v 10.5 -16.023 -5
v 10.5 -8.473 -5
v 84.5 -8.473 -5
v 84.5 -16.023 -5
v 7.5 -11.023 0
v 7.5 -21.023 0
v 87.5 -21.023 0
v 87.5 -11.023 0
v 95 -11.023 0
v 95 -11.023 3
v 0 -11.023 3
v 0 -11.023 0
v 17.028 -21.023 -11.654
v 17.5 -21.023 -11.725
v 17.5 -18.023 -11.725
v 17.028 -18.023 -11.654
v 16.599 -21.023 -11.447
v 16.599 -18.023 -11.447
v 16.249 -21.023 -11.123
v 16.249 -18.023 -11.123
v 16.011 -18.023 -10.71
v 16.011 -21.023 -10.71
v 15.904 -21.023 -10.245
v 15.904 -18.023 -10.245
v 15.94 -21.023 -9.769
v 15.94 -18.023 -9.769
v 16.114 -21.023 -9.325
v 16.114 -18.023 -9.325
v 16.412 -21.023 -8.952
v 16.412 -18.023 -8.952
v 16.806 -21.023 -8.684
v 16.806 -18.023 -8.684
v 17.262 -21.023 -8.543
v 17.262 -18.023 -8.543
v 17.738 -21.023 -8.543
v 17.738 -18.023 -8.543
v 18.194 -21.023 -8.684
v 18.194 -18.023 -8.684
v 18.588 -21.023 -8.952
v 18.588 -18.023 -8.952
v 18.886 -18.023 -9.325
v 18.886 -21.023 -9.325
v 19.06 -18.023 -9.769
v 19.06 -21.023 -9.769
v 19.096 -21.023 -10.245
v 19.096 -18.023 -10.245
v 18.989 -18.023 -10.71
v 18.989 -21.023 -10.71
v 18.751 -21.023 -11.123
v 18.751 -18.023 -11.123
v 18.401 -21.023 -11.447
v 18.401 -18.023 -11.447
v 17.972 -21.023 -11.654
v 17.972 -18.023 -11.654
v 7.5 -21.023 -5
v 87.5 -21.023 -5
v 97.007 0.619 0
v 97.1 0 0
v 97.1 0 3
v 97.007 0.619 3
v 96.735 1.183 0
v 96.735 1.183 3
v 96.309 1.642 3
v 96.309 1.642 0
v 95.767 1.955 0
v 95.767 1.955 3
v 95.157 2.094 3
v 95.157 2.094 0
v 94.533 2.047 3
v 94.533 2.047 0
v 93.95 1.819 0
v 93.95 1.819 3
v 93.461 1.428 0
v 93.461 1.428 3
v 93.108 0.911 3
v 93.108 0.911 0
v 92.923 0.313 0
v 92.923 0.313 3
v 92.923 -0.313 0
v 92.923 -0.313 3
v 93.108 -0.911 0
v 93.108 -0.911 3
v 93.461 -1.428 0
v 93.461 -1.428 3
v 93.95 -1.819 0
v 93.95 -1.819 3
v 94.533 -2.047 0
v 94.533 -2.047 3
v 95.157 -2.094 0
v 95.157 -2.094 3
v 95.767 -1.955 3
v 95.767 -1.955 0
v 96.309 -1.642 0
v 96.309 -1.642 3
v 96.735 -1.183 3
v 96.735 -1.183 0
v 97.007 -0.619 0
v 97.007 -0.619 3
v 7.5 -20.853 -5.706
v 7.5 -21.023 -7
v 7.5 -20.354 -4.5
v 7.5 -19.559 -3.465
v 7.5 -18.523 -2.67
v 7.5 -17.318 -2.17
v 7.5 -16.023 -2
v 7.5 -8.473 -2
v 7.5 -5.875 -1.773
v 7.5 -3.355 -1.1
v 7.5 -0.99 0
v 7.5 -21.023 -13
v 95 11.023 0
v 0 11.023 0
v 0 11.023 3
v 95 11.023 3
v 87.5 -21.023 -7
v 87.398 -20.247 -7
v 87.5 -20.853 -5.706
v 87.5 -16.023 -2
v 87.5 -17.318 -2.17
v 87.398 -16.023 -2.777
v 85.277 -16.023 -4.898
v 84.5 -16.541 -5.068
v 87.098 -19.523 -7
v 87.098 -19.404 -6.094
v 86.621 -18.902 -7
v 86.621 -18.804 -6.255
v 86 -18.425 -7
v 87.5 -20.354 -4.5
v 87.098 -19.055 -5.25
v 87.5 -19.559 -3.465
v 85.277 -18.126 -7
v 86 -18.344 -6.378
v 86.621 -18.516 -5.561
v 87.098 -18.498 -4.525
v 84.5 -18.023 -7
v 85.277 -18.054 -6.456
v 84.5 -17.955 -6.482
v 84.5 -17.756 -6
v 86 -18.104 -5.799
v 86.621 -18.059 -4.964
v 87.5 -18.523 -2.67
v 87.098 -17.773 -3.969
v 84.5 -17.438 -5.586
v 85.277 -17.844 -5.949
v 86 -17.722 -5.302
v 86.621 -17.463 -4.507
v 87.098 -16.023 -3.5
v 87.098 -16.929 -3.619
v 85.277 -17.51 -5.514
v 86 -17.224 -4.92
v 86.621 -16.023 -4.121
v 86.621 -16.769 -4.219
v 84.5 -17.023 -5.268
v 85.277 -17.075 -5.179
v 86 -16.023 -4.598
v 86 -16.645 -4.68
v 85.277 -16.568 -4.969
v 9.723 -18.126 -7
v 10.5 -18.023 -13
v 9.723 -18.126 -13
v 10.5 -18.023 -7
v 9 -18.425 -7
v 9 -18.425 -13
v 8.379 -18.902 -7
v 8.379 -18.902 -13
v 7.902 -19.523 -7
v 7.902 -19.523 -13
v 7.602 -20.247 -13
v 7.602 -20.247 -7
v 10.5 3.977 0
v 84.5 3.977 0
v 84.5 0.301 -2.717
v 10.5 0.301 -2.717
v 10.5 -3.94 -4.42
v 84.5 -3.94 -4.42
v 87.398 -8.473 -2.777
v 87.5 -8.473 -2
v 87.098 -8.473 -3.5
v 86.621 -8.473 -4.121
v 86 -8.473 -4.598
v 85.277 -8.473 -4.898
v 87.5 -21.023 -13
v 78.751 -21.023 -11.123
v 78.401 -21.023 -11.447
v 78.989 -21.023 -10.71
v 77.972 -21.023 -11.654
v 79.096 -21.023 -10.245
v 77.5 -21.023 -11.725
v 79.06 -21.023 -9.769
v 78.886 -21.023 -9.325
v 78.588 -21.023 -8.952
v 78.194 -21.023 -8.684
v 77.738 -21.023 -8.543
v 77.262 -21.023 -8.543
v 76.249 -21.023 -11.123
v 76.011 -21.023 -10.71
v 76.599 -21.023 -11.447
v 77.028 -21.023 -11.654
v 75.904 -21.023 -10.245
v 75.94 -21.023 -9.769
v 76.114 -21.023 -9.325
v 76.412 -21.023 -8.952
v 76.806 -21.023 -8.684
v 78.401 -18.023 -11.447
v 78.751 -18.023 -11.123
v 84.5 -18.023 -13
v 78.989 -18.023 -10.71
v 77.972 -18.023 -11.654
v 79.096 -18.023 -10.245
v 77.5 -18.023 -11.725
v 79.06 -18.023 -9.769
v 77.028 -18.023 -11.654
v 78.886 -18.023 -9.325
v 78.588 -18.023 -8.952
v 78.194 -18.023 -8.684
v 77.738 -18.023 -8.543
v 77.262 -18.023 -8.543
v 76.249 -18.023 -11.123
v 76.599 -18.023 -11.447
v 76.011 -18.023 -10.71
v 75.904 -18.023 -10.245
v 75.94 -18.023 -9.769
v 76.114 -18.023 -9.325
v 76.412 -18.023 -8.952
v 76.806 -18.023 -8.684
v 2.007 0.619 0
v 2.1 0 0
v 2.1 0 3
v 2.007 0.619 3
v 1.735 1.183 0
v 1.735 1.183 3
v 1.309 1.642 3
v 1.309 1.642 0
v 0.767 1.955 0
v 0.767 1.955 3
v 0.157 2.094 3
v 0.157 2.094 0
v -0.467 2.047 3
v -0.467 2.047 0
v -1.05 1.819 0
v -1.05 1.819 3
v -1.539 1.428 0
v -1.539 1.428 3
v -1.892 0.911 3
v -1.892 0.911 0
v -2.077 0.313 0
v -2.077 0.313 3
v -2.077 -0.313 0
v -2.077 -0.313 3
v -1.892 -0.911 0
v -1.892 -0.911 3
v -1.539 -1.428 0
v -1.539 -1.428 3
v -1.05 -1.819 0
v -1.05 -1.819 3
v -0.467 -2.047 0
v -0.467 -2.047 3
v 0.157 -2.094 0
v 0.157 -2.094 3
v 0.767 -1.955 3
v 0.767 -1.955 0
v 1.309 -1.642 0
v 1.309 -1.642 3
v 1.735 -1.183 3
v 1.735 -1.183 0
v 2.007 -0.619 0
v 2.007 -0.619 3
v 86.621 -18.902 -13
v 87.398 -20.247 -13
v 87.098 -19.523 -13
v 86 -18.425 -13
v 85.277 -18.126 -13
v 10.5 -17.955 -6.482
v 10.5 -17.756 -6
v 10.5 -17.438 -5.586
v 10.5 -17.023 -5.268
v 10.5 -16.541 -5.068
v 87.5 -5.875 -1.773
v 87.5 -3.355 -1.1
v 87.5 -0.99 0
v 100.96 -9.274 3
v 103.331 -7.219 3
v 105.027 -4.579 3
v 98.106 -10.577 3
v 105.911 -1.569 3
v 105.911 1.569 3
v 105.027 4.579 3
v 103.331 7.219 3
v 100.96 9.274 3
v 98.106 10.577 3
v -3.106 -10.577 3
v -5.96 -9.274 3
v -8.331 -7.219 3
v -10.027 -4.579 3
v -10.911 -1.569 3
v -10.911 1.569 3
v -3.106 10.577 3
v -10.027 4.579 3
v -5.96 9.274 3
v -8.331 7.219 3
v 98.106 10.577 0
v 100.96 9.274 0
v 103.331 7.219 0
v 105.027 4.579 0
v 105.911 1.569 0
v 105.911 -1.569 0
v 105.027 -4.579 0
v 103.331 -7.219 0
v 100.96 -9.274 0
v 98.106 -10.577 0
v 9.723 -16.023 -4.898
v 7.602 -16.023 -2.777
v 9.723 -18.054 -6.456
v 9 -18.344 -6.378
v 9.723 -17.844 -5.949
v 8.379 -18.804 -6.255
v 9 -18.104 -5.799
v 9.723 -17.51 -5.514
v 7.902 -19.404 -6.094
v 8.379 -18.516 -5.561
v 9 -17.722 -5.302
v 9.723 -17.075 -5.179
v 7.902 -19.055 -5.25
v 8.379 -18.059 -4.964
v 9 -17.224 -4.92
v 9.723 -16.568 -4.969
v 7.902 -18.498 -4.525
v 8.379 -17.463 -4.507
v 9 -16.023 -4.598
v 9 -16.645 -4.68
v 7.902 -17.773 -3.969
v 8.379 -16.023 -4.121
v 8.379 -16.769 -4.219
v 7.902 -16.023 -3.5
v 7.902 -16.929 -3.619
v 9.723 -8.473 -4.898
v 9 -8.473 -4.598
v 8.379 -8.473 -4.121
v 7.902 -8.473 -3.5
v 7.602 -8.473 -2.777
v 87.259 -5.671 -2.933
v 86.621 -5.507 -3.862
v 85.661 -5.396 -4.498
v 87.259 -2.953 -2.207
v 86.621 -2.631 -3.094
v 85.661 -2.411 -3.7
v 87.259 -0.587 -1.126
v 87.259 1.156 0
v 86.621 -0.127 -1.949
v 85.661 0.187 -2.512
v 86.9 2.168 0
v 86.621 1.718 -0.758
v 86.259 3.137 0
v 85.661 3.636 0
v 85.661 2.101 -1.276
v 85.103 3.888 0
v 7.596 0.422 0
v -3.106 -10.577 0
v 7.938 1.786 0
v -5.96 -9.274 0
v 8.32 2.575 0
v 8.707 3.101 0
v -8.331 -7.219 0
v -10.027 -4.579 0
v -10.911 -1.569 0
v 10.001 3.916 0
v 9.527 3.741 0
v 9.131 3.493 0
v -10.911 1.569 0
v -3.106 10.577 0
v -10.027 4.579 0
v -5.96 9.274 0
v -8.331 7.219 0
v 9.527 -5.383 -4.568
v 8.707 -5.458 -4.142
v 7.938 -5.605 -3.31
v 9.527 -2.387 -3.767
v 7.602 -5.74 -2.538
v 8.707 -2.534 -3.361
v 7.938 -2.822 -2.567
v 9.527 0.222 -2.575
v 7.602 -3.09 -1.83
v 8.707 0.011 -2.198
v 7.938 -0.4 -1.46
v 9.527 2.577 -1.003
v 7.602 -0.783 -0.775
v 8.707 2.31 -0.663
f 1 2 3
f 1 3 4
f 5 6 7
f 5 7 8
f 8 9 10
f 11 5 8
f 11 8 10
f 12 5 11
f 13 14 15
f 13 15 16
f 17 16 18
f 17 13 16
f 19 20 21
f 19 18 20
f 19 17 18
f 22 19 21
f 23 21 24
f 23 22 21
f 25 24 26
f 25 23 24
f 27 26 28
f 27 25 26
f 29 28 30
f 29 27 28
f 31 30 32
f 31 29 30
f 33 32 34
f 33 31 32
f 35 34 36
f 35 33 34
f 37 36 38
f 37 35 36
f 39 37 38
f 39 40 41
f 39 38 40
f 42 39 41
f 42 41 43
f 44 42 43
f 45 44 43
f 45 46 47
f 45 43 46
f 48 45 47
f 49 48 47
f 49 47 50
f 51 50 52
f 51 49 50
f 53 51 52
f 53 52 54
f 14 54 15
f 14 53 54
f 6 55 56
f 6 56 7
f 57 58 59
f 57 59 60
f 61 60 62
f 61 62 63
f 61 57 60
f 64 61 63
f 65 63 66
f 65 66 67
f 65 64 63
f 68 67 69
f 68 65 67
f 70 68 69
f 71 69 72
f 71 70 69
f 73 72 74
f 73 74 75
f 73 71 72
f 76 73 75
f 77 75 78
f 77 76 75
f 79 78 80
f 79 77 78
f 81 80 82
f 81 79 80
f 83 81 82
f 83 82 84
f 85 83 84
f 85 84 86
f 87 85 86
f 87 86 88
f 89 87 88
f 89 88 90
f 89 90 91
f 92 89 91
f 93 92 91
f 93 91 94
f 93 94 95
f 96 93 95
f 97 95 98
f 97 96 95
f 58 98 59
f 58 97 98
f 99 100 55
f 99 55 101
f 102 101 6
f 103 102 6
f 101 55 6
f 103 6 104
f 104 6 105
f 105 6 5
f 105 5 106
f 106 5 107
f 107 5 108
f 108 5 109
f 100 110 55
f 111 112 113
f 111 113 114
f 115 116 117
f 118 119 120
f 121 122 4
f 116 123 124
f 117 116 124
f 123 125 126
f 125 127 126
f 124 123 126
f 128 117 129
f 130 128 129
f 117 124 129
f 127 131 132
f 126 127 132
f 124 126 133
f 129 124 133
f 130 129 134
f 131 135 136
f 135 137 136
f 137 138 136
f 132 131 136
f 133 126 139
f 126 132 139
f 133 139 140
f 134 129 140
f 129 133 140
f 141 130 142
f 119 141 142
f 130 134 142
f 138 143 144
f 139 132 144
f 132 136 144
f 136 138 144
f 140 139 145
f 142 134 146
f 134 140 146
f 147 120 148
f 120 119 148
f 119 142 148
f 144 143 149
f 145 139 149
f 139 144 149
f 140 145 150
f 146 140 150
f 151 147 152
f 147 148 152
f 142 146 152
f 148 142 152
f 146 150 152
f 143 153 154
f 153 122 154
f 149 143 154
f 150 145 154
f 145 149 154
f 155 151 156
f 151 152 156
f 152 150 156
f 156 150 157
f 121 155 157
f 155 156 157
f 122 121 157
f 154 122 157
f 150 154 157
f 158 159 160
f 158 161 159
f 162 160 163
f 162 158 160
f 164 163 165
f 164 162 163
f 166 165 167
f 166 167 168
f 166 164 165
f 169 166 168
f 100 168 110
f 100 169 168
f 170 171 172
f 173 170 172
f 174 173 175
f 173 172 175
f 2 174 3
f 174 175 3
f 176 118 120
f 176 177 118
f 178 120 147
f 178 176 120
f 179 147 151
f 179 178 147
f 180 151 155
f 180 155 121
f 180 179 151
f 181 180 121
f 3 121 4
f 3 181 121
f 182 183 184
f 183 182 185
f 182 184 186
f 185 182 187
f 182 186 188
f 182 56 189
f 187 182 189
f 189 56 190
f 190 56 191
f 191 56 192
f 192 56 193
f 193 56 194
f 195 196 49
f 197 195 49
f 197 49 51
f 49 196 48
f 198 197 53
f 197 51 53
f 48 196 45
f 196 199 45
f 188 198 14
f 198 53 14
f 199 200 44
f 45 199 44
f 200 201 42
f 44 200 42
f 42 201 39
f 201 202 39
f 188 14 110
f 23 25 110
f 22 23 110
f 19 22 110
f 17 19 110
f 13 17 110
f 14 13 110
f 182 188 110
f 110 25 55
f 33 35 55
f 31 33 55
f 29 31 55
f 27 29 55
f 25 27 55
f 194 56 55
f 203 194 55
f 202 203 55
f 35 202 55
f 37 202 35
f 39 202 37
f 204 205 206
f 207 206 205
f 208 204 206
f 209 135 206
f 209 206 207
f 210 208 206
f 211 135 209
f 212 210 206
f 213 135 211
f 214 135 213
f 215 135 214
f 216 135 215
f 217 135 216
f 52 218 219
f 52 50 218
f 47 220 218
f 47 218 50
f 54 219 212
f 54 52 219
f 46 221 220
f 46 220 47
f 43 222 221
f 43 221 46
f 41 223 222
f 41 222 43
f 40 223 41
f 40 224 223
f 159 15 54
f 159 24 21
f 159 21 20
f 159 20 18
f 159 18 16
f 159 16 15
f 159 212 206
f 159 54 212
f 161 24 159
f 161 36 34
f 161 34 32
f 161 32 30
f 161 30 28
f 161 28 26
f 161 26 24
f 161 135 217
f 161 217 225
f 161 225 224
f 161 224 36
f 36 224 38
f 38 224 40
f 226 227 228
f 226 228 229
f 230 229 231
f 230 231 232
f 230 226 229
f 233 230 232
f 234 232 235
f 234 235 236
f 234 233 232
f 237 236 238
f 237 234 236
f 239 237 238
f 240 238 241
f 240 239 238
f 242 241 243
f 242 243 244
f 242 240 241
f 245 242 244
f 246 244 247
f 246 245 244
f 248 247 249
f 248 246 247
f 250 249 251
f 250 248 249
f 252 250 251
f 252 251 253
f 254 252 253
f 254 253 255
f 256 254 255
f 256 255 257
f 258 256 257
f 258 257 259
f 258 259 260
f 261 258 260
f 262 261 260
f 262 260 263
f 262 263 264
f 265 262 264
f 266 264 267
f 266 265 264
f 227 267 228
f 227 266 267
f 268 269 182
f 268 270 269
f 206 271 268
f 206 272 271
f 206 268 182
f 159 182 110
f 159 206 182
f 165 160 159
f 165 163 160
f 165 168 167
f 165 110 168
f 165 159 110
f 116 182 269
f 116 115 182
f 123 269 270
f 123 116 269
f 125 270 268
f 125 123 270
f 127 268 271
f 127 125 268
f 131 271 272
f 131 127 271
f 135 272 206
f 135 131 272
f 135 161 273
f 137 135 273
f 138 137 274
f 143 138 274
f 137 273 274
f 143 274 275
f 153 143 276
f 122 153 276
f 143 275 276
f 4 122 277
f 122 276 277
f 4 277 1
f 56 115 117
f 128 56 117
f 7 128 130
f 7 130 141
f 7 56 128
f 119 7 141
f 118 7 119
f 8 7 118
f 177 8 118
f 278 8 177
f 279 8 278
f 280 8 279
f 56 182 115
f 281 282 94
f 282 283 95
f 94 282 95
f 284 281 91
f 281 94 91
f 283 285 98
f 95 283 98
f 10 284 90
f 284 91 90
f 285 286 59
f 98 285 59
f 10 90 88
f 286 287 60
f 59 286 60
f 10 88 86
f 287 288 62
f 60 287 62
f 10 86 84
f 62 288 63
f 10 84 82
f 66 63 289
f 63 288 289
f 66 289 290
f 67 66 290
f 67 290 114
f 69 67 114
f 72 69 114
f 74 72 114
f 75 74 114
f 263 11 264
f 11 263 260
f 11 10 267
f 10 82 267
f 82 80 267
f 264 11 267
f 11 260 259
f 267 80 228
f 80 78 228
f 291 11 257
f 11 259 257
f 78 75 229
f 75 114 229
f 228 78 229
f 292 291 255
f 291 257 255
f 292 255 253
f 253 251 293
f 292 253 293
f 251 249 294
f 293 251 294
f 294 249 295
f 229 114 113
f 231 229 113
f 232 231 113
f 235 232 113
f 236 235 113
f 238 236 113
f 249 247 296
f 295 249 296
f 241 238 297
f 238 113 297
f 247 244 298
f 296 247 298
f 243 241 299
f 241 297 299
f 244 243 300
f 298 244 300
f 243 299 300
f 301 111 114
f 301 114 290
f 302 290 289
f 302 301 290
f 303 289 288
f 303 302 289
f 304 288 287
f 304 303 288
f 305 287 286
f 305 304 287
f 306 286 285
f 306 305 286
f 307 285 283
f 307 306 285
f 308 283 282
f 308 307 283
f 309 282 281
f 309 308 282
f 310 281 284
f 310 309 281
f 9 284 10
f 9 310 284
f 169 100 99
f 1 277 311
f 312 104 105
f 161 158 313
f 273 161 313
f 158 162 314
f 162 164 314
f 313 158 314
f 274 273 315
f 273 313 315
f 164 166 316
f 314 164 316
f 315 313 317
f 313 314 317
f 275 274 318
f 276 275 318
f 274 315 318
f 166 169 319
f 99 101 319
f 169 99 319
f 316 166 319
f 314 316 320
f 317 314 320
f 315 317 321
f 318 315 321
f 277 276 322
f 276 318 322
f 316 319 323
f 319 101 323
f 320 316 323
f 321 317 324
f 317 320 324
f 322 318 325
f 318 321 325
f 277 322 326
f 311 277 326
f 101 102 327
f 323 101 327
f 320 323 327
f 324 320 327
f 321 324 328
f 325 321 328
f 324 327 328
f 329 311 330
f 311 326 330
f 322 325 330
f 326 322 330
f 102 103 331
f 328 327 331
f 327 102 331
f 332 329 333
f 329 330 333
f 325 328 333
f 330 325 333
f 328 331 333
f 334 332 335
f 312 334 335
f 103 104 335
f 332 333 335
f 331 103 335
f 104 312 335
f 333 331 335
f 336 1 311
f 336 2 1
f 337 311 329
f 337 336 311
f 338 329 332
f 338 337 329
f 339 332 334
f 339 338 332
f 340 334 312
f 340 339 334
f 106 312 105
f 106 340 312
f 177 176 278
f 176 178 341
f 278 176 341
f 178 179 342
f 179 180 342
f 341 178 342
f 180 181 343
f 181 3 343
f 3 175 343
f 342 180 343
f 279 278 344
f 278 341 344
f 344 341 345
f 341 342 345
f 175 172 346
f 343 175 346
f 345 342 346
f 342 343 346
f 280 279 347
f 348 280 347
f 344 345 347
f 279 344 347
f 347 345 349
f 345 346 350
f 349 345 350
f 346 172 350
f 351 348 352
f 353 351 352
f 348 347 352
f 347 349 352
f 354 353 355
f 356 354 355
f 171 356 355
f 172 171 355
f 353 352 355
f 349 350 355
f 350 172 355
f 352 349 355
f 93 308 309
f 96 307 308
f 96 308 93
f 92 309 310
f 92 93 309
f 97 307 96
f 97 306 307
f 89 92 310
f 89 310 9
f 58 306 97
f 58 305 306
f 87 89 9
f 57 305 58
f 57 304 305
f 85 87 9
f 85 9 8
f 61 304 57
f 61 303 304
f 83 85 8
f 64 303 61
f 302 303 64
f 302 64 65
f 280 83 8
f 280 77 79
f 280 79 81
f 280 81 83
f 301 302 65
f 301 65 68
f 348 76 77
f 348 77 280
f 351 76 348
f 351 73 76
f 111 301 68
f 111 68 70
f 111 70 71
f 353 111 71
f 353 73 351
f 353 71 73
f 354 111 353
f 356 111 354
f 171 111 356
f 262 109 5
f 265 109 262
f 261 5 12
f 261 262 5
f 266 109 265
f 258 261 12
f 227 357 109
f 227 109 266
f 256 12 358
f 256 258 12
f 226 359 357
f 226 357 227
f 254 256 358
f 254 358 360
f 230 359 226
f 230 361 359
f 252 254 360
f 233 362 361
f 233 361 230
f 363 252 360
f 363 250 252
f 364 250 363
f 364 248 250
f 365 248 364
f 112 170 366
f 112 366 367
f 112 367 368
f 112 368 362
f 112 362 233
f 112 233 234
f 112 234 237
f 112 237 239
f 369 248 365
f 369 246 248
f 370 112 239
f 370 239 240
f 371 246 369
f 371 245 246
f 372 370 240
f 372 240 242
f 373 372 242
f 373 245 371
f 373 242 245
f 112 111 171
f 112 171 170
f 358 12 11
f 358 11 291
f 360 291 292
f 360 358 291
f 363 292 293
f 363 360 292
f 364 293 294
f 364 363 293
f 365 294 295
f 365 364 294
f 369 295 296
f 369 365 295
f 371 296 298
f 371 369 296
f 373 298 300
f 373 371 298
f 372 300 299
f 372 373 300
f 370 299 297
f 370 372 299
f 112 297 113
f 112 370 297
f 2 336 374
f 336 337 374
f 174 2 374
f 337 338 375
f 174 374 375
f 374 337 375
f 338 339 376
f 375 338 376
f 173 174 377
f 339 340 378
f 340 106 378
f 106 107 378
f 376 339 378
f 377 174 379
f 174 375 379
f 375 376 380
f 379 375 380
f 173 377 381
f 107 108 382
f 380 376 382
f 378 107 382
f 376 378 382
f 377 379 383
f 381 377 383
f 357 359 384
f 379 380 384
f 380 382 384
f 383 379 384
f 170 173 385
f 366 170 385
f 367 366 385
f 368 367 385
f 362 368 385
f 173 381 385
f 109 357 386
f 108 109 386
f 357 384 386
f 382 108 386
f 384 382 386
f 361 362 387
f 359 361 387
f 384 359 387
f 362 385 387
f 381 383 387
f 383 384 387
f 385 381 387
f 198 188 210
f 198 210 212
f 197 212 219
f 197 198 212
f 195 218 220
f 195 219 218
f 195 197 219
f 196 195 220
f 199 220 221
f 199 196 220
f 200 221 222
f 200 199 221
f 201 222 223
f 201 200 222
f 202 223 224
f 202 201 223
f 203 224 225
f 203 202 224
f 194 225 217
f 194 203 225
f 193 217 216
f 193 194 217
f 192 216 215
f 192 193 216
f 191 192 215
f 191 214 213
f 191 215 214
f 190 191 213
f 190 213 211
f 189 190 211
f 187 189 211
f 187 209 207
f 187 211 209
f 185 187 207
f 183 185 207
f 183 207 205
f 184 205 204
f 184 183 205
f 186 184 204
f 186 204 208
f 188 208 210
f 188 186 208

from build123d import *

# Parameters (mm, degrees)
SKETCH1_R               = 2.1
BOSS_EXTRUDE1_DEPTH     = 3
BOSS_EXTRUDE2_DEPTH     = 40
FILLET1_R               = 18
SKETCH2_W               = 80
SKETCH2_H               = 3
BOSS_EXTRUDE3_DEPTH     = 8
FILLET2_R               = 2
CUT_EXTRUDE1_DEPTH      = 111.696432989
CUT_EXTRUDE1_DEPTH_BACK = 111.696432989
SKETCH3_R               = 1.6
FILLET3_R               = 3


# Some blends are built 0.0001 mm under size
with BuildPart() as part:
    # Sketch1 → Boss-Extrude1 (new body)
    with BuildSketch(Plane.XY):
        with BuildLine():
            Line((0, 11.023468057), (95, 11.023468057))
            ThreePointArc((95, 11.023468057), (106.023468057, 0), (95, -11.023468057))
            Line((95, -11.023468057), (0, -11.023468057))
            ThreePointArc((0, -11.023468057), (-11.023468057, 0), (0, 11.023468057))
        make_face()
        Circle(SKETCH1_R, mode=Mode.SUBTRACT)
        with Locations((95, 0)):
            Circle(SKETCH1_R, mode=Mode.SUBTRACT)
    extrude(amount=BOSS_EXTRUDE1_DEPTH)

    # 3DSketch1 → Boss-Extrude2 (add, symmetric)
    with BuildSketch(Plane(origin=(47.5, 3.976531943, 0), x_dir=(0, -0.9805806756909202, -0.19611613513818404), z_dir=(-1, 0, 0))):
        Polygon((0, 0), (0.980580676, -4.902903378), (25.495097568, 0), (24.514516892, 4.902903378), align=None)
    extrude(amount=BOSS_EXTRUDE2_DEPTH, both=True)

    # Fillet1
    # the kernel refuses this fillet: 18 mm, written as the material it takes off along each edge
    with BuildSketch(Plane(origin=(118.624748995, 3.976531943, -5), x_dir=(0, 0, 1), z_dir=(-1, 0, 0))) as fillet1_piece_1:
        with BuildLine():
            CenterArc((18, -12.449899598), FILLET1_R, 136.238257307, 43.761742693)
            Line((0, -12.449899598), (-0.36, -12.449899598))
            Line((-0.36, -12.449899598), (-0.36, 0))
            Line((-0.36, 0), (0, 0.36))
            ThreePointArc((0, 0.36), (2.5, 0.36), (4.74, 0.248997992))
            Line((4.74, 0.248997992), (5, 0))
        make_face()
    extrude(amount=142.24949799, mode=Mode.SUBTRACT)

    # Sketch2 → Boss-Extrude3 (add)
    with BuildSketch(Plane(origin=(0, 0, -5), x_dir=(-1, 0, 0), z_dir=(0, 0, -1))):
        with Locations((-47.5, -19.523468057)):
            Rectangle(SKETCH2_W, SKETCH2_H)
    extrude(amount=BOSS_EXTRUDE3_DEPTH)

    # Fillet2
    fillet2_edges = [part.edges().sort_by_distance(p)[0] for p in [
        (47.5, -18.023468057, -5),
    ]]
    fillet(fillet2_edges, radius=FILLET2_R)

    # Sketch3 → Cut-Extrude1 (cut, two sides: drawn at the far end of the back side and taken through both)
    with BuildSketch(Plane(origin=(0, -18.023468057, 0), x_dir=(1, 0, 0), z_dir=(0, 1, 0)).offset(-CUT_EXTRUDE1_DEPTH_BACK)):
        with Locations(Location((17.5, 10.125300862, 0), (0, 0, 90))):
            Circle(SKETCH3_R)
        with Locations(Location((77.5, 10.125300862, 0), (0, 0, 90))):
            Circle(SKETCH3_R)
    extrude(amount=CUT_EXTRUDE1_DEPTH + CUT_EXTRUDE1_DEPTH_BACK, mode=Mode.SUBTRACT)

    # Fillet3
    fillet3_edges = [part.edges().sort_by_distance(p)[0] for p in [
        (7.5, -1.765163723, -3.703293088),
        (87.5, -1.765163723, -3.703293088),
        (7.5, -18.023468057, -10),
        (7.5, -17.43768162, -5.585786438),
        (87.5, -17.43768162, -5.585786438),
        (87.5, -18.023468057, -10),
        (87.5, -12.248417856, -5),
        (7.5, -12.248417856, -5),
    ]]
    fillet(fillet3_edges, radius=FILLET3_R - 0.0001)  # a hair under: the kernel refuses the full size


solid = part.part
